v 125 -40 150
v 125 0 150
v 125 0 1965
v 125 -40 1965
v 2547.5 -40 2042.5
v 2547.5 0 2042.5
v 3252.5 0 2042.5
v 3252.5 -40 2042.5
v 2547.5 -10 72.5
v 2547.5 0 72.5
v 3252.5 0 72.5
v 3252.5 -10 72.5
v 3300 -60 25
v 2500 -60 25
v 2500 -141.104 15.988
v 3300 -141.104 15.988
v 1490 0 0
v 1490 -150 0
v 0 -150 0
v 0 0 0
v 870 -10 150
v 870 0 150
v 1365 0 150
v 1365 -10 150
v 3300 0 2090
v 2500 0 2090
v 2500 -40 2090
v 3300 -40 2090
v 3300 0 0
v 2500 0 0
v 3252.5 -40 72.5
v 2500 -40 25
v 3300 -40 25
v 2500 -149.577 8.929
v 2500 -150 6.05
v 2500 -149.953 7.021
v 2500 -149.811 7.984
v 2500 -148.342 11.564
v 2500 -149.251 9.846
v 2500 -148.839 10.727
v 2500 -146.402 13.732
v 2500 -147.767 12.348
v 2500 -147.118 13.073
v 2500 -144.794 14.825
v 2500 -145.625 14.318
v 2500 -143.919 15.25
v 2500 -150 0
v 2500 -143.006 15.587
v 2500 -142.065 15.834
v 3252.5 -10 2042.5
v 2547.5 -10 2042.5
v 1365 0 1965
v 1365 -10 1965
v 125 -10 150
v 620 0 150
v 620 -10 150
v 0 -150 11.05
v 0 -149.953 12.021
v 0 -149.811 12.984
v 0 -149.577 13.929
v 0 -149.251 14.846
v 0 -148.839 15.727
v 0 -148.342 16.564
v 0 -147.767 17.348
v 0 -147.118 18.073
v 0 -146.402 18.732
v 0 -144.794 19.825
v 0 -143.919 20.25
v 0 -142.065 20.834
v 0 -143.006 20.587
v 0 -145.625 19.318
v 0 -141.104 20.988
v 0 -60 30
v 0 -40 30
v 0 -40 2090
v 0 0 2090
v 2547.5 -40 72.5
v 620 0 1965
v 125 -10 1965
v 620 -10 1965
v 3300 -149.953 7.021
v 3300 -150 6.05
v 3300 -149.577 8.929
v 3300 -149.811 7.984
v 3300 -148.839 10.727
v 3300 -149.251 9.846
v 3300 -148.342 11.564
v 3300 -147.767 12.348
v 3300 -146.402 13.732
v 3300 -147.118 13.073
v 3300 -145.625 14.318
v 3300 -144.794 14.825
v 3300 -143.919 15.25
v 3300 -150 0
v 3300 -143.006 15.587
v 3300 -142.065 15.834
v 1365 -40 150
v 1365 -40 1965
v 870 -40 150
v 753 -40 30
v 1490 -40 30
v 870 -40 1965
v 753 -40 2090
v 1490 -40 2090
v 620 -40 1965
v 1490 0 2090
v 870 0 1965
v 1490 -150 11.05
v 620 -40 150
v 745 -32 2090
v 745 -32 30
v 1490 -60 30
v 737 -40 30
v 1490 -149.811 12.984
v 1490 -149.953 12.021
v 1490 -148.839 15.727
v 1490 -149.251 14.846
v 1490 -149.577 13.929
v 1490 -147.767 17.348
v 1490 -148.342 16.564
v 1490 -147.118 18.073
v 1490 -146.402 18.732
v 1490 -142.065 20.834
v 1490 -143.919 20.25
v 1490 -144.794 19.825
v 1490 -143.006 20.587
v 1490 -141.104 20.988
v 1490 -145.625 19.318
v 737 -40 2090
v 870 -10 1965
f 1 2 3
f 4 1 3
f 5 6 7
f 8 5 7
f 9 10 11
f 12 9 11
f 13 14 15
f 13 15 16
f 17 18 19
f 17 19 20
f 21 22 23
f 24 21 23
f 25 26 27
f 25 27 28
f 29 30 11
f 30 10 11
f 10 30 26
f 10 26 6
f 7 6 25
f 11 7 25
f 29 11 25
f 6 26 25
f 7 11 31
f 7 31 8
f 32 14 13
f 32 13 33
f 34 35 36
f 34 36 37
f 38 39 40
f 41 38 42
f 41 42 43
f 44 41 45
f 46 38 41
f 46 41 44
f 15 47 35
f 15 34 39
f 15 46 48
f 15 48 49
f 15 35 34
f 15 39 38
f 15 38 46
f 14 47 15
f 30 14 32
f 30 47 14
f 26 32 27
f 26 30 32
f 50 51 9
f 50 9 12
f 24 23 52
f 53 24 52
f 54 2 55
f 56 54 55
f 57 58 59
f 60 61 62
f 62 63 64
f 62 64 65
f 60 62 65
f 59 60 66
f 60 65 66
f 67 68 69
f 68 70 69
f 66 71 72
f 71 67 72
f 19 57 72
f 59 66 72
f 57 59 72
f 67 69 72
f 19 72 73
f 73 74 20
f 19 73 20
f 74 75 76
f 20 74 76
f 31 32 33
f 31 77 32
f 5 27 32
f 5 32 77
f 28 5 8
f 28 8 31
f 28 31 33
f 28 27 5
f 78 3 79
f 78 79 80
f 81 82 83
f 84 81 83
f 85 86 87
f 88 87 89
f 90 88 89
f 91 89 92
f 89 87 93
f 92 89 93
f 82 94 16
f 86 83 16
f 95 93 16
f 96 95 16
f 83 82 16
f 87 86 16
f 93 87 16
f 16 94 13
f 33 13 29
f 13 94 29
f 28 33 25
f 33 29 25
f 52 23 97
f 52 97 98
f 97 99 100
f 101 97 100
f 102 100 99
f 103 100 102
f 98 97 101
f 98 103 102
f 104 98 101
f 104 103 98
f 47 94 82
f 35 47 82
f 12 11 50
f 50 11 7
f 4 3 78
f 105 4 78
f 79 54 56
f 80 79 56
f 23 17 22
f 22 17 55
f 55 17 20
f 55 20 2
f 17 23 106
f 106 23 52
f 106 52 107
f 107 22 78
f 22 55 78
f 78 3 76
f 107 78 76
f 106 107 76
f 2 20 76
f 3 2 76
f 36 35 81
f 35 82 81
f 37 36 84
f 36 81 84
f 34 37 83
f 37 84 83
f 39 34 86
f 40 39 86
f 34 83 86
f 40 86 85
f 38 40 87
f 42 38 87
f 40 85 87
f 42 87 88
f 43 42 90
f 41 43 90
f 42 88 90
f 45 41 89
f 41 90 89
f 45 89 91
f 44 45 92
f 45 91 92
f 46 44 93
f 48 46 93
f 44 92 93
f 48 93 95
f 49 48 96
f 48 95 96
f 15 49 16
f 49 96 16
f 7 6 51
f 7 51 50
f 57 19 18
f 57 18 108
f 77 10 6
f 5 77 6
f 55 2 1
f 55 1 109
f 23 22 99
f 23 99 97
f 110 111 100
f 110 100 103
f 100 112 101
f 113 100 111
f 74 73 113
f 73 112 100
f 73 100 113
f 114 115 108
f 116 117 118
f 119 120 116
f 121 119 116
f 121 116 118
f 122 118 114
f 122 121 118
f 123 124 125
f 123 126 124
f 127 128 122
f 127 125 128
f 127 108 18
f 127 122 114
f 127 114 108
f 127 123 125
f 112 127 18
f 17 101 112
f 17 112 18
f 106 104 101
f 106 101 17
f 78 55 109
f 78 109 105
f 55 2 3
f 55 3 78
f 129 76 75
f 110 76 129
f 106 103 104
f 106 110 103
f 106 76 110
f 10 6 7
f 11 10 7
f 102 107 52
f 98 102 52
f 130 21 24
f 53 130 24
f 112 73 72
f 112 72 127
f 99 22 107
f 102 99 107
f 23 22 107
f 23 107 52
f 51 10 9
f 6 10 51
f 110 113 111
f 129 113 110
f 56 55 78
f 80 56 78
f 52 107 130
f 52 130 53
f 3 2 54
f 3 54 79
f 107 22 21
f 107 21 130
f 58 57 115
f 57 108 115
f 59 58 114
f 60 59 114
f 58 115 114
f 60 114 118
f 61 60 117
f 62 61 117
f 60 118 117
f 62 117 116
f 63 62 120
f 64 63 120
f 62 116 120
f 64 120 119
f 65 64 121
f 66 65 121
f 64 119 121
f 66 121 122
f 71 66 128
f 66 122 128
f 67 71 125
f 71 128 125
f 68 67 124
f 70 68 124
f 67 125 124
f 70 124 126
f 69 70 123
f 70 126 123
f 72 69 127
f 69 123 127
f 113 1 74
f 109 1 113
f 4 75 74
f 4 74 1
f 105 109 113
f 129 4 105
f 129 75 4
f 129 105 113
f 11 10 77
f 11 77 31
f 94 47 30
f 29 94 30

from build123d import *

# Parameters (mm, degrees)
F1_W      = 150
F1_H      = 30
F2_DEPTH  = 1490
F3_SIZE2  = 90
F3_SIZE   = 10
F4_R      = 10
F0_W      = 745
F0_H      = 2065
F0_W_2    = 495
F0_H_2    = 1815
F5_DEPTH  = 40
F6_SIZE   = 8
F7_DEPTH  = 40
F8_SIZE   = 7.99999
F9_DEPTH  = 10
F10_DEPTH = 10
F13_W     = 150
F13_H     = 25
F14_DEPTH = 800
F15_SIZE2 = 90
F15_SIZE  = 10
F16_R     = 10
F12_W     = 800
F12_H     = 2065
F12_W_2   = 705
F12_H_2   = 1970
F17_DEPTH = 40
F18_DEPTH = 10


# Not quite as in the source:
# - a fillet or chamfer is up to 0.001 mm smaller than in the source, because OpenCascade refuses the exact size


with BuildPart() as f2:
    # F1 (on Right) → F2 (new body)
    with BuildSketch(Plane.YZ):
        with Locations((-75, 15)):
            Rectangle(F1_W, F1_H)
    extrude(amount=F2_DEPTH)

    # F3
    f3_edges = [f2.edges().sort_by_distance(p)[0] for p in [
        (745, -150, 30),
    ]]
    f3_side = f2.faces().sort_by_distance((745, -150, 15))[0]
    chamfer(f3_edges, length=F3_SIZE, length2=F3_SIZE2, reference=f3_side)

    # F4
    f4_edges = [f2.edges().sort_by_distance(p)[0] for p in [
        (745, -150, 20),
    ]]
    fillet(f4_edges, radius=F4_R)

    # F0 (on Front) → F5 (join)
    with BuildSketch(Plane.XZ):
        with Locations((372.5, 1057.5)):
            Rectangle(F0_W, F0_H)
        with Locations((372.5, 1057.5)):
            Rectangle(F0_W_2, F0_H_2, mode=Mode.SUBTRACT)
    extrude(amount=F5_DEPTH)

    # F6
    f6_edges = [f2.edges().sort_by_distance(p)[0] for p in [
        (745, -40, 1060),
    ]]
    chamfer(f6_edges, length=F6_SIZE)

    # F0 (on Front) → F7 (join)
    with BuildSketch(Plane.XZ):
        with Locations((1117.5, 1057.5)):
            Rectangle(F0_W, F0_H)
        with Locations((1117.5, 1057.5)):
            Rectangle(F0_W_2, F0_H_2, mode=Mode.SUBTRACT)
    extrude(amount=F7_DEPTH)

    # F8 (size 8 in the source; OpenCascade refuses exactly that, so slightly less here)
    f8_edges = [f2.edges().sort_by_distance(p)[0] for p in [
        (745, -40, 1060),
    ]]
    chamfer(f8_edges, length=F8_SIZE)


with BuildPart() as f9:
    # F0 (on Front) → F9 (new body)
    with BuildSketch(Plane.XZ):
        with Locations((372.5, 1057.5)):
            Rectangle(F0_W_2, F0_H_2)
    extrude(amount=F9_DEPTH)


with BuildPart() as f10:
    # F0 (on Front) → F10 (new body)
    with BuildSketch(Plane.XZ):
        with Locations((1117.5, 1057.5)):
            Rectangle(F0_W_2, F0_H_2)
    extrude(amount=F10_DEPTH)


with BuildPart() as f14:
    # F13 (on offset) → F14 (new body)
    with BuildSketch(Plane.YZ.offset(2500)):
        with Locations((-75, 12.5)):
            Rectangle(F13_W, F13_H)
    extrude(amount=F14_DEPTH)

    # F15
    f15_edges = [f14.edges().sort_by_distance(p)[0] for p in [
        (2900, -150, 25),
    ]]
    f15_side = f14.faces().sort_by_distance((2900, -150, 12.5))[0]
    chamfer(f15_edges, length=F15_SIZE, length2=F15_SIZE2, reference=f15_side)

    # F16
    f16_edges = [f14.edges().sort_by_distance(p)[0] for p in [
        (2900, -150, 15),
    ]]
    fillet(f16_edges, radius=F16_R)

    # F12 (on Front) → F17 (join)
    with BuildSketch(Plane.XZ):
        with Locations((2900, 1057.5)):
            Rectangle(F12_W, F12_H)
        with Locations((2900, 1057.5)):
            Rectangle(F12_W_2, F12_H_2, mode=Mode.SUBTRACT)
    extrude(amount=F17_DEPTH)


with BuildPart() as f18:
    # F12 (on Front) → F18 (new body)
    with BuildSketch(Plane.XZ):
        with Locations((2900, 1057.5)):
            Rectangle(F12_W_2, F12_H_2)
    extrude(amount=F18_DEPTH)


solid = Compound([f2.part, f9.part, f10.part, f14.part, f18.part])
